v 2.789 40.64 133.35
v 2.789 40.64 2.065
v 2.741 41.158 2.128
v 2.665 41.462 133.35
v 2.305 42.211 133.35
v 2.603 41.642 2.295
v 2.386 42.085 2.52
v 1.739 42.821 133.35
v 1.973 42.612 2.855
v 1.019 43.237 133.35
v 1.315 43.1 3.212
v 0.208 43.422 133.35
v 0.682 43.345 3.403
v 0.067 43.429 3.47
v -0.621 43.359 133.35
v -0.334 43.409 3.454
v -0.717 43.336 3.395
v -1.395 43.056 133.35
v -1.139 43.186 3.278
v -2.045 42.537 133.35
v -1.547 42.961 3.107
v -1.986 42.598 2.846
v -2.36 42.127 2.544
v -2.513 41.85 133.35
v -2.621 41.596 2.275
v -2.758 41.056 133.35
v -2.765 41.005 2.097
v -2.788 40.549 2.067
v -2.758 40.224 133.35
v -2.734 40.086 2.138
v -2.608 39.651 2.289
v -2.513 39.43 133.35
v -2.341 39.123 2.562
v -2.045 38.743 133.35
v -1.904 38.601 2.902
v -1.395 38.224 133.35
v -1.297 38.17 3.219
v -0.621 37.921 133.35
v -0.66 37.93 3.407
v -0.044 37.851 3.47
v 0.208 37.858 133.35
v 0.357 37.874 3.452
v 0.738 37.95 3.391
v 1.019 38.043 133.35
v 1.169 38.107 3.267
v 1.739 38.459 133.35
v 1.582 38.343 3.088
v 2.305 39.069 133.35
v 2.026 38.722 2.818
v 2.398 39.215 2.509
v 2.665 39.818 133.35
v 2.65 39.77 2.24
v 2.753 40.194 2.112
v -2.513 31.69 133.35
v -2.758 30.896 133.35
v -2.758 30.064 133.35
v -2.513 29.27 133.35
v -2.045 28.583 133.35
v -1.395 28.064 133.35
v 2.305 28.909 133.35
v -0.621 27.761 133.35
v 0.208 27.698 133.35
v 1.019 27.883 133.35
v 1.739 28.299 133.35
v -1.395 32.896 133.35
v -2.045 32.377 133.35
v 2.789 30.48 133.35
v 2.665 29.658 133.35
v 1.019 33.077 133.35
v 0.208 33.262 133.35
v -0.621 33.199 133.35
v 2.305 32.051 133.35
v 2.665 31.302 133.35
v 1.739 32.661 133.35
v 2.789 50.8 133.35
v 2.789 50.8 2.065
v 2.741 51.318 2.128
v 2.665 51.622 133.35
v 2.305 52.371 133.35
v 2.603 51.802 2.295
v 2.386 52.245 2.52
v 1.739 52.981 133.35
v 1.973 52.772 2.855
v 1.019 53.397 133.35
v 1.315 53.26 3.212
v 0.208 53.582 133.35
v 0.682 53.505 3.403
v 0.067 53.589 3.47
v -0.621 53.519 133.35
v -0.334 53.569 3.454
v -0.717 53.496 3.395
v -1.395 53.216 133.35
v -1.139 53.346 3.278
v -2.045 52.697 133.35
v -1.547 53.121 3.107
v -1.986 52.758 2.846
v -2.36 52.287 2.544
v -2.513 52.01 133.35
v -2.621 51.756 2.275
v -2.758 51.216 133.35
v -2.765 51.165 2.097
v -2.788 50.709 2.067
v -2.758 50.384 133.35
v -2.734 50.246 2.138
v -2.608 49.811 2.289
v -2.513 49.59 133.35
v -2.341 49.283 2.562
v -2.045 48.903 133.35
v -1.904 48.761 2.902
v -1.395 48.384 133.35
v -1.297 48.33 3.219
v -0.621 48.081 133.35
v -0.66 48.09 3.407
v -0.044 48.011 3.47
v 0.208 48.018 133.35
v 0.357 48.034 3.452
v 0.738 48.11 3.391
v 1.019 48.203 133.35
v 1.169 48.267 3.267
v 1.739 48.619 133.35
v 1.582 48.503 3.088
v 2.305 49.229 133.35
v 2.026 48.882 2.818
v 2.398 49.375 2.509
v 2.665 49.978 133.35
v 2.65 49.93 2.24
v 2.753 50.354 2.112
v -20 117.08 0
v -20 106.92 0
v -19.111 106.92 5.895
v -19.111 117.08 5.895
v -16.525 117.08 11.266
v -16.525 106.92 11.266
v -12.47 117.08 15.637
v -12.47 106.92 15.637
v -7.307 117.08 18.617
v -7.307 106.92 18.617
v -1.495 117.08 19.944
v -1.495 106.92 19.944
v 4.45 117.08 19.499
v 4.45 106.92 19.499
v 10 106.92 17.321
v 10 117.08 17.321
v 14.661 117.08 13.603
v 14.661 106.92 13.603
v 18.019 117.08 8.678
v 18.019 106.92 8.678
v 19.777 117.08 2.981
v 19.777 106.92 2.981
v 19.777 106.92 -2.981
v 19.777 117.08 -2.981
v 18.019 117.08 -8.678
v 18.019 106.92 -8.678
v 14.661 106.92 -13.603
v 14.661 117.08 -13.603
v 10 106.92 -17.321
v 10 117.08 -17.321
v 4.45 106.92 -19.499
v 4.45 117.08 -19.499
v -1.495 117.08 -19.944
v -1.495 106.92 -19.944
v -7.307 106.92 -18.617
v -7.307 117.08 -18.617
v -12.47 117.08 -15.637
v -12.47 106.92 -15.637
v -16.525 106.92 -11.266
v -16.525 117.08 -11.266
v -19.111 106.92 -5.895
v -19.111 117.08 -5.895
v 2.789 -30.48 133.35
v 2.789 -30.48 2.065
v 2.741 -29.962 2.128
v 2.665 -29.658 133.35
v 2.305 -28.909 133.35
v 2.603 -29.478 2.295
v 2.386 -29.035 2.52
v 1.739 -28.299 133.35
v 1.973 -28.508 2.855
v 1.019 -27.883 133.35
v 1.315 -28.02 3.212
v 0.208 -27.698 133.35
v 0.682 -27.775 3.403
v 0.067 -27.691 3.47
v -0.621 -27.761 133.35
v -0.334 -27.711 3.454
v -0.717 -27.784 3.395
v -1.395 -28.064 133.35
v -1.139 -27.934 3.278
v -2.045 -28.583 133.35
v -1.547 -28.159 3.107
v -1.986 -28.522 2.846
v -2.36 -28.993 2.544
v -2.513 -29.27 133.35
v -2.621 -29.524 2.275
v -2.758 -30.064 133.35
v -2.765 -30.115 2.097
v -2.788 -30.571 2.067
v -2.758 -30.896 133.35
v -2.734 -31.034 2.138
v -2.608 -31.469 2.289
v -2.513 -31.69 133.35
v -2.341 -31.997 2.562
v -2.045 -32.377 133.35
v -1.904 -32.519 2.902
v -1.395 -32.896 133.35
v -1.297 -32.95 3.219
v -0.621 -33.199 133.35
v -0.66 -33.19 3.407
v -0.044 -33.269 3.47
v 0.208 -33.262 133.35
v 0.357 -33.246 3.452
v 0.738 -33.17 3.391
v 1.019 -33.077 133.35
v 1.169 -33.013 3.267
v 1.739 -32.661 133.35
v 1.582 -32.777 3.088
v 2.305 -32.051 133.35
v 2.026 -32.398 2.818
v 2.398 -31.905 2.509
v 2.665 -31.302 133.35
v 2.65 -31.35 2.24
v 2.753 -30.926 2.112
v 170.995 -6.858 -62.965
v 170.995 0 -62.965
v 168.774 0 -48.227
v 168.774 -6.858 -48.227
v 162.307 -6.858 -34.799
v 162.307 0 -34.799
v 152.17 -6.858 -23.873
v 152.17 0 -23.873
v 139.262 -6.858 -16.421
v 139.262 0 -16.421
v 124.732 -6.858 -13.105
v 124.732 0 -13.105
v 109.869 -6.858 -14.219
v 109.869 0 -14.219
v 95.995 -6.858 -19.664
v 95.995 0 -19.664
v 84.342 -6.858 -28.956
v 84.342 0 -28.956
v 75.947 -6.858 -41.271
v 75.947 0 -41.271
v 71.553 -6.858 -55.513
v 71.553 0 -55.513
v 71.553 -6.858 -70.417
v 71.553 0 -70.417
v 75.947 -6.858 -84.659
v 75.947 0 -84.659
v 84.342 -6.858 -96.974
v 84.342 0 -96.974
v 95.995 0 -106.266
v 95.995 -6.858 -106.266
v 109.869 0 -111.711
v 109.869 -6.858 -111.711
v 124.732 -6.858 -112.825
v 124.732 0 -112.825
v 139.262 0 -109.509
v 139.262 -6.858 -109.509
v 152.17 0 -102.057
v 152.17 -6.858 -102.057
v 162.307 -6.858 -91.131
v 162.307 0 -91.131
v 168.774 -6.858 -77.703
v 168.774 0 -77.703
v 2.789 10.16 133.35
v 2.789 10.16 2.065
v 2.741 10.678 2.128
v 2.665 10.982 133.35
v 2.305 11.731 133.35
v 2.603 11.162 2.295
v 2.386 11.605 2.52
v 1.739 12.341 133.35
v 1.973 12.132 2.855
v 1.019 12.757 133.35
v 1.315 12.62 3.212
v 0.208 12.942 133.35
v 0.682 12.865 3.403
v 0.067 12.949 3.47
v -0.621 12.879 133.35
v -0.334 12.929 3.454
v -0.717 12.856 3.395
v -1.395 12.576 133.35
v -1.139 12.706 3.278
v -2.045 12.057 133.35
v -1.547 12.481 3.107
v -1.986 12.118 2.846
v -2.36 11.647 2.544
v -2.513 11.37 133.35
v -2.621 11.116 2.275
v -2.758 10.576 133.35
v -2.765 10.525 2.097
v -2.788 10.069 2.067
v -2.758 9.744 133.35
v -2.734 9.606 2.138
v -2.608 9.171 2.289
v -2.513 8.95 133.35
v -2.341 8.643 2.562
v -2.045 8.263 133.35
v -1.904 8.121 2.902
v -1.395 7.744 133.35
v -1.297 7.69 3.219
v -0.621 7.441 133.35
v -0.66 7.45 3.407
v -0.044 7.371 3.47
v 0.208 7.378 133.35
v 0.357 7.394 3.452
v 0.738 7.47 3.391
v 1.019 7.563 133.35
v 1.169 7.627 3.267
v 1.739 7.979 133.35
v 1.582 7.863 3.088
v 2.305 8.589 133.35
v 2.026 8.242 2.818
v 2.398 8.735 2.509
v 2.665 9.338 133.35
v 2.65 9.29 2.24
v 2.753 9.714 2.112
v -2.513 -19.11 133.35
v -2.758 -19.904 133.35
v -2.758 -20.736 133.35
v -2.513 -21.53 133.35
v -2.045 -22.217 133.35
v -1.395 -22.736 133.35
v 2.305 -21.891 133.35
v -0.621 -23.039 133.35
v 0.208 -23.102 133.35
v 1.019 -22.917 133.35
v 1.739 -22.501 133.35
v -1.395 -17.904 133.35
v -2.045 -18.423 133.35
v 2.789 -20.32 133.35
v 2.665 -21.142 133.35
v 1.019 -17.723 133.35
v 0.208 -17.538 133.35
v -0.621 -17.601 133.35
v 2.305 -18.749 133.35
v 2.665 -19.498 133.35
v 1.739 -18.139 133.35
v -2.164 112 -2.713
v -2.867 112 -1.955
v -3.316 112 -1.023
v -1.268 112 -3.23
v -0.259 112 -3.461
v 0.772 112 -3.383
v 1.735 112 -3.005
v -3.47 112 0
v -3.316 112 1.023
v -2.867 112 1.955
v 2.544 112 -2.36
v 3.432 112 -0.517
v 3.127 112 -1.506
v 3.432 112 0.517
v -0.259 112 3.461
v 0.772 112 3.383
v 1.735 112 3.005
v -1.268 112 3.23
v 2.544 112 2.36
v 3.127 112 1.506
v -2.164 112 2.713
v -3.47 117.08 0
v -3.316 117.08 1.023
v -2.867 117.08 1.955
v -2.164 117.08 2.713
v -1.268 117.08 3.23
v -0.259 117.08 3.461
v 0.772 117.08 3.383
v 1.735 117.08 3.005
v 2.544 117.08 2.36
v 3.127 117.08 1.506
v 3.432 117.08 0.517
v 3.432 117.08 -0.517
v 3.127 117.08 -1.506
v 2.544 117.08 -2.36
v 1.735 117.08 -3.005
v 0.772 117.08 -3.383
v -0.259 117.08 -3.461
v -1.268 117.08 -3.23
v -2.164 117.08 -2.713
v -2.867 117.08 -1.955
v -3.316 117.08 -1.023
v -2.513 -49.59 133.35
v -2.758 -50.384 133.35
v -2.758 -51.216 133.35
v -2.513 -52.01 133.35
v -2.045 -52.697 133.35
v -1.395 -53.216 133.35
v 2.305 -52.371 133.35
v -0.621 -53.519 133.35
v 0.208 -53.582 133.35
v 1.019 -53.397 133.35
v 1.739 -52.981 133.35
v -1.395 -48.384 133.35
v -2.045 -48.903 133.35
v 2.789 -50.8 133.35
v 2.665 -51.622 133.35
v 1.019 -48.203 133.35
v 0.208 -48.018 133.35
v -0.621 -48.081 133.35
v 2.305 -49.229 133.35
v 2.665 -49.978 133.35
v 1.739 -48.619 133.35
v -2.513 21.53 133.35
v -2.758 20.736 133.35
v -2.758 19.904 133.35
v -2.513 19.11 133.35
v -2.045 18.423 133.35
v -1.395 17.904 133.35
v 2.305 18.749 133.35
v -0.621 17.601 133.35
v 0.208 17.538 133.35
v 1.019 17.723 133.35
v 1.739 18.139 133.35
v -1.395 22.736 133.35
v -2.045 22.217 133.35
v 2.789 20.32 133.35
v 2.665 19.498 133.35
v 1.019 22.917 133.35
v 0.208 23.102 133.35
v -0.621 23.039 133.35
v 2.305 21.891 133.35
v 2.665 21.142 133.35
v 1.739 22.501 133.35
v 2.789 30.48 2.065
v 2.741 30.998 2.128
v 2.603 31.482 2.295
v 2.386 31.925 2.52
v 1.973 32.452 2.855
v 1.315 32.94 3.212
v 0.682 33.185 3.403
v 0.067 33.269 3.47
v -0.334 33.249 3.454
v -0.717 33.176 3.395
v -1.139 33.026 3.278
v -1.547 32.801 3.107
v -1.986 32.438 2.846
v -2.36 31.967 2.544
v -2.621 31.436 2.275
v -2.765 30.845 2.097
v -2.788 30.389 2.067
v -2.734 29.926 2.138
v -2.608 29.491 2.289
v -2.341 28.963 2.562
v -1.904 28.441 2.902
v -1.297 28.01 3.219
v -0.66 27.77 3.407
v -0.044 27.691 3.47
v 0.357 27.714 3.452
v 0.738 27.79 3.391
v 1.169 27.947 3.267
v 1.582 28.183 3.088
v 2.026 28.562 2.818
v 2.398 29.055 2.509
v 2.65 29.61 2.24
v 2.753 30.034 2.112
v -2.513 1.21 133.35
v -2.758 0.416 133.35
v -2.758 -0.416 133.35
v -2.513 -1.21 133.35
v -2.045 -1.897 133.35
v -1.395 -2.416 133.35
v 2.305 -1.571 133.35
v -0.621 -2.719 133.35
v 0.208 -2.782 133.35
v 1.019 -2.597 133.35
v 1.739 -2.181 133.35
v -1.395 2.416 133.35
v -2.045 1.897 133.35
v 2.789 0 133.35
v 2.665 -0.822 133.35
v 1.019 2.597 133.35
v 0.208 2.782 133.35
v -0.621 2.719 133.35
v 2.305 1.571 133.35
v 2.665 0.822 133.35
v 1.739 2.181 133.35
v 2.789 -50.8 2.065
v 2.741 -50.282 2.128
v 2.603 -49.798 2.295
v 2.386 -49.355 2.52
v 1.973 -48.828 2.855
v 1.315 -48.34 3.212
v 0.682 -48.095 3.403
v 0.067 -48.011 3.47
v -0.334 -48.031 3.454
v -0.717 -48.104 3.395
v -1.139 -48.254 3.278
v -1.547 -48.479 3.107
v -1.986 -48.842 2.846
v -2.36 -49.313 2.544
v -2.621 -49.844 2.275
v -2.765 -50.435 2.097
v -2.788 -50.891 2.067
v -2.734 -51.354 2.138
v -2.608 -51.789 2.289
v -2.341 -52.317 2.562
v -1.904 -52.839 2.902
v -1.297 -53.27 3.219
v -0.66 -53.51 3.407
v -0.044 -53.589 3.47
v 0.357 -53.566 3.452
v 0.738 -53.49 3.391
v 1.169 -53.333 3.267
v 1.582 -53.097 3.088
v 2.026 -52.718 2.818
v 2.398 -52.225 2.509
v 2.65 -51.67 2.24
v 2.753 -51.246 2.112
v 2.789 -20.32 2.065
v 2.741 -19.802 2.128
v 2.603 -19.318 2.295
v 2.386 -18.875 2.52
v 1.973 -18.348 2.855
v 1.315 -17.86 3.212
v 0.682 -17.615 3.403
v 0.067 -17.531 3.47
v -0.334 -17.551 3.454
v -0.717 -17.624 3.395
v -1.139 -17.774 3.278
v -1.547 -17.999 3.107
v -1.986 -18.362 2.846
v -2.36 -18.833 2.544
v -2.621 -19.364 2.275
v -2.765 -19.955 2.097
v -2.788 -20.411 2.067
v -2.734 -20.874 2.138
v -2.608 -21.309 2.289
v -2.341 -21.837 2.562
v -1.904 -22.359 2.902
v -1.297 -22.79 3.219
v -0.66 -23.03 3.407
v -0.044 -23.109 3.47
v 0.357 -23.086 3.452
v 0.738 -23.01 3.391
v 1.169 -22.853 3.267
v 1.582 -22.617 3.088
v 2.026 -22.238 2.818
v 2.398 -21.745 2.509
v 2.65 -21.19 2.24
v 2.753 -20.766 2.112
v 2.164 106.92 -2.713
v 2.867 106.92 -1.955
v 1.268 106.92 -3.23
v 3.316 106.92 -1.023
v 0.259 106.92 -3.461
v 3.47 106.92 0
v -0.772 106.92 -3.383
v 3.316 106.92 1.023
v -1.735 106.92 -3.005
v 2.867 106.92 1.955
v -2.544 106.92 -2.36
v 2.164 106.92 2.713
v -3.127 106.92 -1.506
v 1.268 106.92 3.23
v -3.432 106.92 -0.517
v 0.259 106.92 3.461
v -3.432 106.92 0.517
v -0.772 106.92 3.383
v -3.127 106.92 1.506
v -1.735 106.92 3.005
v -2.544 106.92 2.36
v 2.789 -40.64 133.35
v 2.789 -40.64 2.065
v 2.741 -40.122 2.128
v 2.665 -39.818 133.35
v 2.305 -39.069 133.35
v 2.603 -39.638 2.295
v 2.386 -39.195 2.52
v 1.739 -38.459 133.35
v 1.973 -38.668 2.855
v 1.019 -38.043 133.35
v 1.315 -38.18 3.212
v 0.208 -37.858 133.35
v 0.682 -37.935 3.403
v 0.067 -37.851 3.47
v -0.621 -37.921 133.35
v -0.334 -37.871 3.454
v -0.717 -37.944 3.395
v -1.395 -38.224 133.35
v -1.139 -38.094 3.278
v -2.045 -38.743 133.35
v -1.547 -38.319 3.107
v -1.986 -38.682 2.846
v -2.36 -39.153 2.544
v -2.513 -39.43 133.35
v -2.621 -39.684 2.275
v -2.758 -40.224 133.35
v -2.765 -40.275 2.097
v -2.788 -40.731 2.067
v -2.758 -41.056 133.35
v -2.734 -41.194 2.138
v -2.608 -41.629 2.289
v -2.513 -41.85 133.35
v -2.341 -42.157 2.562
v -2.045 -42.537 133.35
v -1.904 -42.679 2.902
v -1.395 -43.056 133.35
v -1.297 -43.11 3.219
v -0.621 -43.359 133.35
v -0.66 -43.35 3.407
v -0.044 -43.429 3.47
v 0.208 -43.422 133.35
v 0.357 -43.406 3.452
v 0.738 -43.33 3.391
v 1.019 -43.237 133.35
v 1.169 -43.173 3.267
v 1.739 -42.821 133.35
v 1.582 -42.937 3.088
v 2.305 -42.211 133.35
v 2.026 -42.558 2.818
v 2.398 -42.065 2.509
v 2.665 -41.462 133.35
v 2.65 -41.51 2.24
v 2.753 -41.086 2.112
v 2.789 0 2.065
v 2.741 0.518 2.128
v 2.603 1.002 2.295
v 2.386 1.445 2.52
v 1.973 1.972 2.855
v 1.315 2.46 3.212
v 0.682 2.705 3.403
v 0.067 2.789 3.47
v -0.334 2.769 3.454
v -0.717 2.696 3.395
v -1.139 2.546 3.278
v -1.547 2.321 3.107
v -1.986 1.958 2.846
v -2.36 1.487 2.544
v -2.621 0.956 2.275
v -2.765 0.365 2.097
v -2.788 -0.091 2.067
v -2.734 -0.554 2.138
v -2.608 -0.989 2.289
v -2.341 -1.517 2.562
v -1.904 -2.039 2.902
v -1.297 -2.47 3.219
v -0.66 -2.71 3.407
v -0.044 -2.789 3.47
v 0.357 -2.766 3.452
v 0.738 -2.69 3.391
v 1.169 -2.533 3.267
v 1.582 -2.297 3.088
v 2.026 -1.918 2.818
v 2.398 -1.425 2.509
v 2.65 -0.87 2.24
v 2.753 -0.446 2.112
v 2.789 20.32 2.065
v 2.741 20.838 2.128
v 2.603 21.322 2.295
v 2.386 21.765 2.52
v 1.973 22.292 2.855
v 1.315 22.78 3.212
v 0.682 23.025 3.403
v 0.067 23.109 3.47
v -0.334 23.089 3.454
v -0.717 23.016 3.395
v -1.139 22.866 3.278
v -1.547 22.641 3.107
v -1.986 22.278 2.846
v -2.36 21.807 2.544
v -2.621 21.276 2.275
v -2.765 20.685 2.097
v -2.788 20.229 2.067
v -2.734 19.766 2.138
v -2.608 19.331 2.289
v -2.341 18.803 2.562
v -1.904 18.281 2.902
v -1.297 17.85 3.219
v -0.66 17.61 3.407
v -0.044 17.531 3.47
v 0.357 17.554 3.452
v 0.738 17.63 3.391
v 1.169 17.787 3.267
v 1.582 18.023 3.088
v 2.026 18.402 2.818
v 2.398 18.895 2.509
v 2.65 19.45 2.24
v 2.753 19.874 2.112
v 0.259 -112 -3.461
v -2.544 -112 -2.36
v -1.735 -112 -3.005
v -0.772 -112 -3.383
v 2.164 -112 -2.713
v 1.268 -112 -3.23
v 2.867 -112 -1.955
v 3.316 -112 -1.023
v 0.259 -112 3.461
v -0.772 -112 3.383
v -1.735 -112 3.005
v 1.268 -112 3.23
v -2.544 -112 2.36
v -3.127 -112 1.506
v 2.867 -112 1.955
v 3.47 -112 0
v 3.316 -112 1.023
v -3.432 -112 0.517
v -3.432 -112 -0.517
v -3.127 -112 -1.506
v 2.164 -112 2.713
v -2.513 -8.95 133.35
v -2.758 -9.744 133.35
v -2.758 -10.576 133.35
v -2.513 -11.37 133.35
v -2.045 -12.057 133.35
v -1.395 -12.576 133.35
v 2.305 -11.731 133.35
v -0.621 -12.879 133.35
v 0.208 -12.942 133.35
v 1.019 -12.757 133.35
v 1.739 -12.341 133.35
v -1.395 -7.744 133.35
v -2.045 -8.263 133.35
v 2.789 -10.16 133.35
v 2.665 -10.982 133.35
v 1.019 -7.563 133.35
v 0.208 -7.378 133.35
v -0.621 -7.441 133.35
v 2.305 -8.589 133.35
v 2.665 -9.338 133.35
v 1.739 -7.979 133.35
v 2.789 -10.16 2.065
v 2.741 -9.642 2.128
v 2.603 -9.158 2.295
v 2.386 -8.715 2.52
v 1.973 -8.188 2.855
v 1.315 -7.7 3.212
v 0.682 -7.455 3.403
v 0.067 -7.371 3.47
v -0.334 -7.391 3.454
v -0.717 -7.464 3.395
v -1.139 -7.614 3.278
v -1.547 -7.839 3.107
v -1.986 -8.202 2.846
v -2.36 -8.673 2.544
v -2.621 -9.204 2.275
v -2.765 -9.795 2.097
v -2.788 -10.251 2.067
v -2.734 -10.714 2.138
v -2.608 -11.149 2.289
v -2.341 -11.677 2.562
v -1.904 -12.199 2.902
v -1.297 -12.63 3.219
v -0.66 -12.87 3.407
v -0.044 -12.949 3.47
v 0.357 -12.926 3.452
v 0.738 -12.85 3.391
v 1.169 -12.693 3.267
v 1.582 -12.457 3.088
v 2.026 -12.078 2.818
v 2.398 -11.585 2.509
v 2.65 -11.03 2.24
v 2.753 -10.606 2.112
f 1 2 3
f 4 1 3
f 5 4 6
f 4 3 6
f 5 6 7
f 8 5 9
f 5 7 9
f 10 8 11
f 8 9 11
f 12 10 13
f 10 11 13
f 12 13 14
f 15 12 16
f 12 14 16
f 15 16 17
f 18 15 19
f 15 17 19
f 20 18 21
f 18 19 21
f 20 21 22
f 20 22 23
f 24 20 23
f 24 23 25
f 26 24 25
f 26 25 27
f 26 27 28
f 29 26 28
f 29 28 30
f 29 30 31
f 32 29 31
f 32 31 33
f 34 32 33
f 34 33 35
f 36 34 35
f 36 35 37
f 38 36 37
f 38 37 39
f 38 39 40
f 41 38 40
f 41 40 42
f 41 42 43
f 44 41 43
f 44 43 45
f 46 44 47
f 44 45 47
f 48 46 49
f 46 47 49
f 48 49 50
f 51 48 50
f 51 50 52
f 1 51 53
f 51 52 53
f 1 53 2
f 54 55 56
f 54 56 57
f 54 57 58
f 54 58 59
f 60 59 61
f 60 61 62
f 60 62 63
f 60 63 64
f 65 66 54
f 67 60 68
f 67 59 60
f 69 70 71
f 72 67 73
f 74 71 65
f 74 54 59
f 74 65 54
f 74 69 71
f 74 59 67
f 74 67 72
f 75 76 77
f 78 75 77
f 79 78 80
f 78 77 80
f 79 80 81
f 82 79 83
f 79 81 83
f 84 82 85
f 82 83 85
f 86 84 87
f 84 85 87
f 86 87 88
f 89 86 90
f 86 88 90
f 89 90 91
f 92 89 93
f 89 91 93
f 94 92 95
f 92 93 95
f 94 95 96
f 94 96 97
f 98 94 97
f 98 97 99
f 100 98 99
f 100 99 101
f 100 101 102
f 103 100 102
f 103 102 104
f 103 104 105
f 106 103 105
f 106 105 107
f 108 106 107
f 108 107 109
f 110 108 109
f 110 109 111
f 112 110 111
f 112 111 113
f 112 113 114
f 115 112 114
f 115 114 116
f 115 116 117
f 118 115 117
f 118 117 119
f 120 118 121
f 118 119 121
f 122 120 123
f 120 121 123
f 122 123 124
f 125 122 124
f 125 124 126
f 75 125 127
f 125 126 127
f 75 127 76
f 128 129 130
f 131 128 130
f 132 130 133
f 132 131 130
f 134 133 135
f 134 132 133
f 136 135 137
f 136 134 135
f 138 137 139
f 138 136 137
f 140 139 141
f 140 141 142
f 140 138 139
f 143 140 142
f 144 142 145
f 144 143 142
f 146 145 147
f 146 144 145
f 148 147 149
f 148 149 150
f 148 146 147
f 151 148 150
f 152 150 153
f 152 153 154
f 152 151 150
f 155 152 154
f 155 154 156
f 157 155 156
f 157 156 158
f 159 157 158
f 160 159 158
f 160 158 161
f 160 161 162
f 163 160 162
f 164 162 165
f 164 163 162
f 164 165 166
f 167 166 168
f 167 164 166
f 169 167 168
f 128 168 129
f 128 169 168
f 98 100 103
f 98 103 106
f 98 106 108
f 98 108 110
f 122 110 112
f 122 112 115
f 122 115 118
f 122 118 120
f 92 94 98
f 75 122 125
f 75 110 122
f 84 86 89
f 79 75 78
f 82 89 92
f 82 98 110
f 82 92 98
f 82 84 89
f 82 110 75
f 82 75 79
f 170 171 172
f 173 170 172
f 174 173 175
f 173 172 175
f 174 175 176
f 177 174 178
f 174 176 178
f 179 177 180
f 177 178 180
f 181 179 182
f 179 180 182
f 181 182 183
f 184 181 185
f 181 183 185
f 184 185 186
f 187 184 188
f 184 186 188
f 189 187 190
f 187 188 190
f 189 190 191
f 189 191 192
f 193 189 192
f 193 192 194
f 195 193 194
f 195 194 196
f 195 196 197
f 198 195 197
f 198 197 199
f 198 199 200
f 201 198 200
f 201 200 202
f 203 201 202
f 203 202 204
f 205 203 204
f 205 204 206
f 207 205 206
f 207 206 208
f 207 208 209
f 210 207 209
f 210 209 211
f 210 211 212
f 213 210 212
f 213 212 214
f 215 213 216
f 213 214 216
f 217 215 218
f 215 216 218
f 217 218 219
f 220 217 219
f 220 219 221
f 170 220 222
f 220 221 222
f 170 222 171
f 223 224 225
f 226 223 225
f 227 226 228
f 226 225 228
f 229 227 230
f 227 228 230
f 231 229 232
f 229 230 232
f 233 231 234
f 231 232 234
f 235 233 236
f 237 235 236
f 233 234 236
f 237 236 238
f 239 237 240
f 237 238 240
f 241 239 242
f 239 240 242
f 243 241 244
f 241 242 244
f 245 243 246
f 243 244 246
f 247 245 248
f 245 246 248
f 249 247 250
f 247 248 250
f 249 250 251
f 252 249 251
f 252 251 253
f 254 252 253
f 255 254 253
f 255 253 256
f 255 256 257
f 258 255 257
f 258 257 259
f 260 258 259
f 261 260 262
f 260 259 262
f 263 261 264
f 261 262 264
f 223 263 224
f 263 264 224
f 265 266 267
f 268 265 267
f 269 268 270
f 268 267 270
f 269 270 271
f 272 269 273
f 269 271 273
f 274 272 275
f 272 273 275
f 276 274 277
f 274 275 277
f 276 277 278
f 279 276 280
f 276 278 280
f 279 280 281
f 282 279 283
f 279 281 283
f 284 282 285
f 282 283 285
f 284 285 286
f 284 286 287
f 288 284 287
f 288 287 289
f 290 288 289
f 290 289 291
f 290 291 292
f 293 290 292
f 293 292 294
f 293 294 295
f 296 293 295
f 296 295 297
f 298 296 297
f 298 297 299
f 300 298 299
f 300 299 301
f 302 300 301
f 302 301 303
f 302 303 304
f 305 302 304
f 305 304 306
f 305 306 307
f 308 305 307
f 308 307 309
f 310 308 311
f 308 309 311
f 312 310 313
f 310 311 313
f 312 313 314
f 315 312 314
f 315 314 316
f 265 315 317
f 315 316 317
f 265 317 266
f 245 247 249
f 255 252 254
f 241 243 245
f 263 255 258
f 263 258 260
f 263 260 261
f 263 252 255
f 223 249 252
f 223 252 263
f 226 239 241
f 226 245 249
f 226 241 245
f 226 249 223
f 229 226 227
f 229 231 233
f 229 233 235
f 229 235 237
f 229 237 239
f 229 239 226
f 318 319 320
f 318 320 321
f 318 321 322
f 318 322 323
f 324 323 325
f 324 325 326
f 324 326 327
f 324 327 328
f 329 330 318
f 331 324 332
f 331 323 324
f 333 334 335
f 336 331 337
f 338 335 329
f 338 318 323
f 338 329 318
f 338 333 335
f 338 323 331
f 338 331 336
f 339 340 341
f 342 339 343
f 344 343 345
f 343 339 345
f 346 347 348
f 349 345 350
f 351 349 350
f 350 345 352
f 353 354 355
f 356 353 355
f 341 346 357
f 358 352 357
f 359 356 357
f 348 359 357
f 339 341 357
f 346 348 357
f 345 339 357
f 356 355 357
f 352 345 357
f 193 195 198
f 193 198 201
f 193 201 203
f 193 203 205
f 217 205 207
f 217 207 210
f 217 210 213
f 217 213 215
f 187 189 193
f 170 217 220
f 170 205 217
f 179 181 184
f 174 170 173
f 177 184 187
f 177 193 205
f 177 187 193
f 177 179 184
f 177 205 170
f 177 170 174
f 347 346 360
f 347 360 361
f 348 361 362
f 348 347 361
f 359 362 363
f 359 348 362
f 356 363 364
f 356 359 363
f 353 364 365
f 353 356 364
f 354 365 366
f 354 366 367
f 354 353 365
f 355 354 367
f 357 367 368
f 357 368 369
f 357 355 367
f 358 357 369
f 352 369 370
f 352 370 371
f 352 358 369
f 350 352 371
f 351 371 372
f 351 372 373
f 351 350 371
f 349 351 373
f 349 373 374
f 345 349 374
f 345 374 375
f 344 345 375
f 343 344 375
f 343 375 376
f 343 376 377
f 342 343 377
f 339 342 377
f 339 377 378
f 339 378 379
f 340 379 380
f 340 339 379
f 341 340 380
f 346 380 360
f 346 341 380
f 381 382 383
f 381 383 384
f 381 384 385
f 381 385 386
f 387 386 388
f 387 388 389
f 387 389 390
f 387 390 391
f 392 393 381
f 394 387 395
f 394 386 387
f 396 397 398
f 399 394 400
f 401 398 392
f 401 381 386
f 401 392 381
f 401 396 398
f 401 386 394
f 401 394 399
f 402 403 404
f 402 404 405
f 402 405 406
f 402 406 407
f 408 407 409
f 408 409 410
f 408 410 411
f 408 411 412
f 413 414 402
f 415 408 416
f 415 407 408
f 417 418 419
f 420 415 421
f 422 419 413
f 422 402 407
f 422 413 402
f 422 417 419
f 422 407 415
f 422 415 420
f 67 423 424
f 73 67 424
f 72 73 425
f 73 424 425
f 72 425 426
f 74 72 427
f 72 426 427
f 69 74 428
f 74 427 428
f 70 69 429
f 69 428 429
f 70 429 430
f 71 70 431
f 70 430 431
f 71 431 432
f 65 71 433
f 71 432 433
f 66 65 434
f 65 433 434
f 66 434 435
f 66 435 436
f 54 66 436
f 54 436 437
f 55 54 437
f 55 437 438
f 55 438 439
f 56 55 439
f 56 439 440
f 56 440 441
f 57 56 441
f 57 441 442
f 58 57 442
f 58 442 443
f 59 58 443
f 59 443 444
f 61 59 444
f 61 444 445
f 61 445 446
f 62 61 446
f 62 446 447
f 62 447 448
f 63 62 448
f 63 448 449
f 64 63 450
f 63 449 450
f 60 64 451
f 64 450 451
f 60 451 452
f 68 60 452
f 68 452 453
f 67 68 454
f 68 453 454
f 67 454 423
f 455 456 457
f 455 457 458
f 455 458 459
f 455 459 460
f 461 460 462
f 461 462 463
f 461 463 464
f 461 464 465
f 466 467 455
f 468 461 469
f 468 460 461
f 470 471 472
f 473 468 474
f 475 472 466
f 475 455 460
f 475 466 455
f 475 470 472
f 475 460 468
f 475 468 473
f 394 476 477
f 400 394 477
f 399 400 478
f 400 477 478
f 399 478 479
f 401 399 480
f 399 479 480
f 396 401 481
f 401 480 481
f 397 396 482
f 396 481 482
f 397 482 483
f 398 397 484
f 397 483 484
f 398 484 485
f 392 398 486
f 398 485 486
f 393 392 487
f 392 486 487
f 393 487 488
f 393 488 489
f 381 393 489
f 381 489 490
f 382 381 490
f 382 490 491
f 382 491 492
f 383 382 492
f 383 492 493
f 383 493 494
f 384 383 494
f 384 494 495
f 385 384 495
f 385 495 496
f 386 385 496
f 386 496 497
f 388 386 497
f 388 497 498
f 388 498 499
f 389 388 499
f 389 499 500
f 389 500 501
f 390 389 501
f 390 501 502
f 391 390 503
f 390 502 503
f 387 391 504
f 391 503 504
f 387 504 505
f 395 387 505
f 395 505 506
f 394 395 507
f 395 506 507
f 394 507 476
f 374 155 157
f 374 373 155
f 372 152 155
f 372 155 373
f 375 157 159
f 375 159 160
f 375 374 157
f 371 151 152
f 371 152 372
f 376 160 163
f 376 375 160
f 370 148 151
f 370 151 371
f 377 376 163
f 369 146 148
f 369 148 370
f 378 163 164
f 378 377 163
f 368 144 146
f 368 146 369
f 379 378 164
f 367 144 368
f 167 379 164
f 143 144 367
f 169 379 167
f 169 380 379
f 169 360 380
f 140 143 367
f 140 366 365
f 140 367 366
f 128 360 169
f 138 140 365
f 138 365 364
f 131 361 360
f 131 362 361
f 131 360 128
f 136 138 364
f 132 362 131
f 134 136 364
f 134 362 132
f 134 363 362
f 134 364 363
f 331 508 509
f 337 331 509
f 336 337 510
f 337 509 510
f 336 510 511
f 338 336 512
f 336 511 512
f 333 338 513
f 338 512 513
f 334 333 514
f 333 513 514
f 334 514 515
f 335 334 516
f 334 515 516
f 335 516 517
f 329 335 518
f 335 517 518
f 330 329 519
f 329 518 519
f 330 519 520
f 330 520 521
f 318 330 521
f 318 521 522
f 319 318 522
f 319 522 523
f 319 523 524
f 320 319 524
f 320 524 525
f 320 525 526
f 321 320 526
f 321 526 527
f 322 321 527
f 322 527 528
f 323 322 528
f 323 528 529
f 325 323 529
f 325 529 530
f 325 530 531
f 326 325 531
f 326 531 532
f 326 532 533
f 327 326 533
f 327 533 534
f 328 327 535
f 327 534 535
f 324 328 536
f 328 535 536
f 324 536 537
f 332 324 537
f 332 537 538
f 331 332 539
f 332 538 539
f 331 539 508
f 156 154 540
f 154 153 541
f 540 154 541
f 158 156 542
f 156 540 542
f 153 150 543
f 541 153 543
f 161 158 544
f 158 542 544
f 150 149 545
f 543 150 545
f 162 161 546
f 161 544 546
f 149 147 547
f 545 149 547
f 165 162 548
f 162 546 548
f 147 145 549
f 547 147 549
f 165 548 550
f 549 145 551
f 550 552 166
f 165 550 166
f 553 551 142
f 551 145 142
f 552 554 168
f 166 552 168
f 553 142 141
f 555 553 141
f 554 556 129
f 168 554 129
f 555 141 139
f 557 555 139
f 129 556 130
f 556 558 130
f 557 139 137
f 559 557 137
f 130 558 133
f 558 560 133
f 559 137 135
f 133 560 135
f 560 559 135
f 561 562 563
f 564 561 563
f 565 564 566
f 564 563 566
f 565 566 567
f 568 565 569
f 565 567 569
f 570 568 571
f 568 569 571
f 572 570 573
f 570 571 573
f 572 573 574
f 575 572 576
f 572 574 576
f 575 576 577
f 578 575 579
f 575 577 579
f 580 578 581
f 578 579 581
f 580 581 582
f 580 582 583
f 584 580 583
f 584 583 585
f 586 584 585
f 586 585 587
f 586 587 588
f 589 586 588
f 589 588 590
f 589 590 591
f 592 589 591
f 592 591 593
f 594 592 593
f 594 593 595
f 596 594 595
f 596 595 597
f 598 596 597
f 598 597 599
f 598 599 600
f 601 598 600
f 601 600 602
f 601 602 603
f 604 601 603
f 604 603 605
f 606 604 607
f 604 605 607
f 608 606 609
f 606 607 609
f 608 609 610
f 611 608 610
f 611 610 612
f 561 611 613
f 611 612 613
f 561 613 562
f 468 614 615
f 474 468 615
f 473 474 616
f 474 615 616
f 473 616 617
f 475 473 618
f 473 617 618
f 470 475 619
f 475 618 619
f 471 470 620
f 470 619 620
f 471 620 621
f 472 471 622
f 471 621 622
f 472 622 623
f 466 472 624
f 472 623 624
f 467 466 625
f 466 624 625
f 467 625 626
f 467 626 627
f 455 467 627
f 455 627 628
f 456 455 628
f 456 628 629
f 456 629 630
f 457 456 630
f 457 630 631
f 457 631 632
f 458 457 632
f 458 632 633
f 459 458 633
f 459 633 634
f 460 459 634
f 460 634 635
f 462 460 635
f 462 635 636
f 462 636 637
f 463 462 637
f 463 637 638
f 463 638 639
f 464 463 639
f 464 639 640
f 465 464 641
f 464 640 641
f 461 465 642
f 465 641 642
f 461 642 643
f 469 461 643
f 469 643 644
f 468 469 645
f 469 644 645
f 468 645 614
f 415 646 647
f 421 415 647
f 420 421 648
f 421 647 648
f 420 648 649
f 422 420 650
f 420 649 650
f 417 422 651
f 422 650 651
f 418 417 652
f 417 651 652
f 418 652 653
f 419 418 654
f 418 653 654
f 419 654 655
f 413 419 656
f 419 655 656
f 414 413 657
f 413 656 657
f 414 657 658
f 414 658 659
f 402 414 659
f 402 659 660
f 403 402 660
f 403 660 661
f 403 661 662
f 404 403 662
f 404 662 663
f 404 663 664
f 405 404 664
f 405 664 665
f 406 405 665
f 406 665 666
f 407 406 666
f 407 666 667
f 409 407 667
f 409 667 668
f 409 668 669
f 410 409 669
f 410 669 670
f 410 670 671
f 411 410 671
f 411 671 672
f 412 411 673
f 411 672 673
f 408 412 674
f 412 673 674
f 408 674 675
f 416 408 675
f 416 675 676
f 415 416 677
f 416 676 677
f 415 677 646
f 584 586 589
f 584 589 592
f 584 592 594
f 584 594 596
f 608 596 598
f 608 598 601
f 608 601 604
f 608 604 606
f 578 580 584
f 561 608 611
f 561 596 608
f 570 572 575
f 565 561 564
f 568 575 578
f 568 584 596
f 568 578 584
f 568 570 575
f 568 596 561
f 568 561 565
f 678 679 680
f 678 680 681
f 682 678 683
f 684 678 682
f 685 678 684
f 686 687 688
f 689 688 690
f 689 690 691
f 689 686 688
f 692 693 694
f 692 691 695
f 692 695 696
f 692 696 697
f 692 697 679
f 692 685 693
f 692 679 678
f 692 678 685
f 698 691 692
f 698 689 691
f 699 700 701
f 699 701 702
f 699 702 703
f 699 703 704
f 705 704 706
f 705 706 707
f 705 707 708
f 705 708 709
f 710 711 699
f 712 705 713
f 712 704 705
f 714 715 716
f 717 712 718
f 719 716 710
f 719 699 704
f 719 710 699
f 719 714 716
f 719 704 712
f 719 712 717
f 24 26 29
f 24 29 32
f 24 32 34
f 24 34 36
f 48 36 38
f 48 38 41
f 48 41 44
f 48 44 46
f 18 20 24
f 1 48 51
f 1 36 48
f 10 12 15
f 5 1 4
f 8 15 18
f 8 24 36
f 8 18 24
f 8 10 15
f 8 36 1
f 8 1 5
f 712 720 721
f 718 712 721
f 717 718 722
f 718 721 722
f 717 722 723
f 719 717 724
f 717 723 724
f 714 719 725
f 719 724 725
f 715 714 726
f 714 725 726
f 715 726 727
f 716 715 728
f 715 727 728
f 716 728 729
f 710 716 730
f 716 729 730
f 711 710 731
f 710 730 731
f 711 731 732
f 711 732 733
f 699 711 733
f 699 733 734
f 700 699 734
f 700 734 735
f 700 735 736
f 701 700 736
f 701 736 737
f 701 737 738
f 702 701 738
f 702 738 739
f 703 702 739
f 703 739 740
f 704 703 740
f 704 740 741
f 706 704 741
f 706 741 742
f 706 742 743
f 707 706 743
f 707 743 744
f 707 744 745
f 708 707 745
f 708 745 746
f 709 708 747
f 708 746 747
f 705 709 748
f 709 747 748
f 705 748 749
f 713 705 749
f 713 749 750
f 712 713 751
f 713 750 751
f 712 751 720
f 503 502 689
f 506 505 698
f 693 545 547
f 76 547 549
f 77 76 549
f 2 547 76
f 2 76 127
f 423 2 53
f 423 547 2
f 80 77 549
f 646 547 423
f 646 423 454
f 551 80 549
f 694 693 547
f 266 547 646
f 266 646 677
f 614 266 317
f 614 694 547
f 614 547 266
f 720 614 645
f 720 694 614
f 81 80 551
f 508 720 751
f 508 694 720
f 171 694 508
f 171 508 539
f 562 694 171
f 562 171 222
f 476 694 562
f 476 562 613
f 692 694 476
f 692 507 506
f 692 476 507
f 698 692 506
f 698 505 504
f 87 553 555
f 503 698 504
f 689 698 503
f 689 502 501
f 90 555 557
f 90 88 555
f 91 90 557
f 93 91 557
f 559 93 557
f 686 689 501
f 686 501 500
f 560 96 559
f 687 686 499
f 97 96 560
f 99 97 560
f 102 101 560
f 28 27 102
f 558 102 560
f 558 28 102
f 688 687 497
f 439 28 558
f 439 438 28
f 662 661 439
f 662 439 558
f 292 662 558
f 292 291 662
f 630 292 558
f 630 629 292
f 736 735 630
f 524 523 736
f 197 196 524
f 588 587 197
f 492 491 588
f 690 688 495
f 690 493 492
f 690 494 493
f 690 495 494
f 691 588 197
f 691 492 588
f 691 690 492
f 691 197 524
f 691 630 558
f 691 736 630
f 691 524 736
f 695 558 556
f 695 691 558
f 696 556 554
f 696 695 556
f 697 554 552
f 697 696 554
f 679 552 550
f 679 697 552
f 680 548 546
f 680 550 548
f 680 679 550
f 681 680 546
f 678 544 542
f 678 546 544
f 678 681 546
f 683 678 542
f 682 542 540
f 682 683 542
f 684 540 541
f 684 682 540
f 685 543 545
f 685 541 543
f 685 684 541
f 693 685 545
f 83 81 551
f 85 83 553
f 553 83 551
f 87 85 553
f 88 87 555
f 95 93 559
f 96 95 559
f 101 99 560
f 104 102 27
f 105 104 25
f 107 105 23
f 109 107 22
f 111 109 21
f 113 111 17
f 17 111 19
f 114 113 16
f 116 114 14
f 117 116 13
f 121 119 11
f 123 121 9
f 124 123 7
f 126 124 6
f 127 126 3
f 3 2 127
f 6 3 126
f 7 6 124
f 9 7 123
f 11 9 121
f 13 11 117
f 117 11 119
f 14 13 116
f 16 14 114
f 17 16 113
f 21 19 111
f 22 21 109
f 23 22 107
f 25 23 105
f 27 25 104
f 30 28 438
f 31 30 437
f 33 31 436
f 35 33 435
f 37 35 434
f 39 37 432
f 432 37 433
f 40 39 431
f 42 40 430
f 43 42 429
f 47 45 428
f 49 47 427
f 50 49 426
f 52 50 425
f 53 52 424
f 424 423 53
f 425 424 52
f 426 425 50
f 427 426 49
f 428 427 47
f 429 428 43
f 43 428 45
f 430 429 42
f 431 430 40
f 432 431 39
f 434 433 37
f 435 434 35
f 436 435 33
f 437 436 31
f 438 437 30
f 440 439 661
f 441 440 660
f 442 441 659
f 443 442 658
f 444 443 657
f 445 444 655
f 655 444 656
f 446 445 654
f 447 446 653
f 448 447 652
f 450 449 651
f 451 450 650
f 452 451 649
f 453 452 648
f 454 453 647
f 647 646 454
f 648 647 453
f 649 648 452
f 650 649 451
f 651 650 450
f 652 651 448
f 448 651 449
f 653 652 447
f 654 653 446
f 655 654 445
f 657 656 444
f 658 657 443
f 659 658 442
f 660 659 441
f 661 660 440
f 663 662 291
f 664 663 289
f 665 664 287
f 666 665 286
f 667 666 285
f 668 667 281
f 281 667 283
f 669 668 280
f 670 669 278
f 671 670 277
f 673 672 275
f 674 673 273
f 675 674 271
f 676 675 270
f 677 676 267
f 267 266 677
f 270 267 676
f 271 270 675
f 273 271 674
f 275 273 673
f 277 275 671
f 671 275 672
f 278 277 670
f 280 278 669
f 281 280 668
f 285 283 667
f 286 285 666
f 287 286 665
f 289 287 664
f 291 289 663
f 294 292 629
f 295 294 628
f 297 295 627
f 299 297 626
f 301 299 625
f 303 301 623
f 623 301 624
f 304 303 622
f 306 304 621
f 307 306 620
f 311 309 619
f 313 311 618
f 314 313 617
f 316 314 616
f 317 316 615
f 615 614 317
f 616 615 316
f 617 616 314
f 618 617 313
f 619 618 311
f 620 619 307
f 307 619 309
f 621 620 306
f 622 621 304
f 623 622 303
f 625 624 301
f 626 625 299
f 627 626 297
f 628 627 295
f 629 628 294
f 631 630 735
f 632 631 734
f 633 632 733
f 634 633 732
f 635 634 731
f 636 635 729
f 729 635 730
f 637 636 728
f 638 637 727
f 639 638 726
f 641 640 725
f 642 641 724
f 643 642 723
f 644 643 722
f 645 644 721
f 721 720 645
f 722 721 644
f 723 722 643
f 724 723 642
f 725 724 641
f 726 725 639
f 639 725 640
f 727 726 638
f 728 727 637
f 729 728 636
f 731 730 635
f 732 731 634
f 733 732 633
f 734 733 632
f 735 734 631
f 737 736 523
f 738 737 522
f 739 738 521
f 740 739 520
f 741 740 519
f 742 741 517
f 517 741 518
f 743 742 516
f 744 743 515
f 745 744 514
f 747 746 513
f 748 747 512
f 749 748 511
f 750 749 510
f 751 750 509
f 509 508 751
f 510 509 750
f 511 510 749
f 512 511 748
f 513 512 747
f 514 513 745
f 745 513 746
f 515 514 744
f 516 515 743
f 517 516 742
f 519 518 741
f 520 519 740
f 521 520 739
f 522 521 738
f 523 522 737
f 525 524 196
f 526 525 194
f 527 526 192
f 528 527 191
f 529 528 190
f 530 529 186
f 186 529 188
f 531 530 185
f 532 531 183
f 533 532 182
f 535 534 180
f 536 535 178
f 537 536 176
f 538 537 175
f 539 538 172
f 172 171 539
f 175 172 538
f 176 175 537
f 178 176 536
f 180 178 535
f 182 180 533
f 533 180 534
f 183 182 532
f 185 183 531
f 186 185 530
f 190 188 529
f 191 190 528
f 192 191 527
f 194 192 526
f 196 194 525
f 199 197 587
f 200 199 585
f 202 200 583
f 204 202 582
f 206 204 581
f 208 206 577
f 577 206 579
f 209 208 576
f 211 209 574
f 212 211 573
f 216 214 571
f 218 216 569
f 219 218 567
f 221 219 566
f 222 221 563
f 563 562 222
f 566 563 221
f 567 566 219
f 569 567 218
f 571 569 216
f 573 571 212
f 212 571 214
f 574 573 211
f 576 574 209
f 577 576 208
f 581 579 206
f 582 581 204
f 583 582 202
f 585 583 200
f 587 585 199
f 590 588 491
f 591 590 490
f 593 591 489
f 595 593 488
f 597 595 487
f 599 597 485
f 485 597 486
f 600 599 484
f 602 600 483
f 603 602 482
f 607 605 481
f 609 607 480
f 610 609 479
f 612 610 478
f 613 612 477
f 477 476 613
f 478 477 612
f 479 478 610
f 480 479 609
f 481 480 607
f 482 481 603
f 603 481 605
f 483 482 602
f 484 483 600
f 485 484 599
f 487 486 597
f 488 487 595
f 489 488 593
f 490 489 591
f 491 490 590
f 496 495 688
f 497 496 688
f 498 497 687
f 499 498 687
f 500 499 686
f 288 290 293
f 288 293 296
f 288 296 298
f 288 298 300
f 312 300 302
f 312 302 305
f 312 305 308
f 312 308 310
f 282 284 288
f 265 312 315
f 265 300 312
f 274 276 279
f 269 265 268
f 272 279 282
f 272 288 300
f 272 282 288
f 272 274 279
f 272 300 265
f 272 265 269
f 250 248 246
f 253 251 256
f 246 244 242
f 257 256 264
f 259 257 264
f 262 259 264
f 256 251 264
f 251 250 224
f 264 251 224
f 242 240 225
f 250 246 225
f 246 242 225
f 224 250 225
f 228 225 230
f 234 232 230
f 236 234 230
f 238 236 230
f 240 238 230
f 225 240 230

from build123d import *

# Parameters (mm, degrees)
F0_R     = 3.470275
F1_DEPTH = 112
F2_R     = 2.789366
F3_DEPTH = 133.35
F4_R     = 20
F4_R_2   = 3.470275
F5_DEPTH = 5.08
F6_R     = 50
F7_DEPTH = 6.858


with BuildPart() as f1:
    # F0 (on Front) → F1 (new body, symmetric)
    with BuildSketch(Plane.XZ):
        Circle(F0_R)
    extrude(amount=F1_DEPTH, both=True)

    # F2 (on Top) → F3 (join)
    with BuildSketch(Plane.XY):
        Circle(F2_R)
        with Locations((0, 10.16)):
            Circle(F2_R)
        with Locations((0, 20.32)):
            Circle(F2_R)
        with Locations((0, 30.48)):
            Circle(F2_R)
        with Locations((0, 40.64)):
            Circle(F2_R)
        with Locations((0, 50.8)):
            Circle(F2_R)
        with Locations((0, -10.16)):
            Circle(F2_R)
        with Locations((0, -20.32)):
            Circle(F2_R)
        with Locations((0, -30.48)):
            Circle(F2_R)
        with Locations((0, -40.64)):
            Circle(F2_R)
        with Locations((0, -50.8)):
            Circle(F2_R)
    extrude(amount=F3_DEPTH)

    # F4 (on face) → F5 (join, symmetric)
    with BuildSketch(Plane(origin=(0, 112, 0), x_dir=(-1, 0, 0), z_dir=(0, 1, 0))):
        Circle(F4_R)
        Circle(F4_R_2, mode=Mode.SUBTRACT)
    extrude(amount=F5_DEPTH, both=True)


with BuildPart() as f7:
    # F6 (on Front) → F7 (new body)
    with BuildSketch(Plane.XZ):
        with Locations((120.995037, -62.964983)):
            Circle(F6_R)
    extrude(amount=F7_DEPTH)


solid = Compound([f1.part, f7.part])
